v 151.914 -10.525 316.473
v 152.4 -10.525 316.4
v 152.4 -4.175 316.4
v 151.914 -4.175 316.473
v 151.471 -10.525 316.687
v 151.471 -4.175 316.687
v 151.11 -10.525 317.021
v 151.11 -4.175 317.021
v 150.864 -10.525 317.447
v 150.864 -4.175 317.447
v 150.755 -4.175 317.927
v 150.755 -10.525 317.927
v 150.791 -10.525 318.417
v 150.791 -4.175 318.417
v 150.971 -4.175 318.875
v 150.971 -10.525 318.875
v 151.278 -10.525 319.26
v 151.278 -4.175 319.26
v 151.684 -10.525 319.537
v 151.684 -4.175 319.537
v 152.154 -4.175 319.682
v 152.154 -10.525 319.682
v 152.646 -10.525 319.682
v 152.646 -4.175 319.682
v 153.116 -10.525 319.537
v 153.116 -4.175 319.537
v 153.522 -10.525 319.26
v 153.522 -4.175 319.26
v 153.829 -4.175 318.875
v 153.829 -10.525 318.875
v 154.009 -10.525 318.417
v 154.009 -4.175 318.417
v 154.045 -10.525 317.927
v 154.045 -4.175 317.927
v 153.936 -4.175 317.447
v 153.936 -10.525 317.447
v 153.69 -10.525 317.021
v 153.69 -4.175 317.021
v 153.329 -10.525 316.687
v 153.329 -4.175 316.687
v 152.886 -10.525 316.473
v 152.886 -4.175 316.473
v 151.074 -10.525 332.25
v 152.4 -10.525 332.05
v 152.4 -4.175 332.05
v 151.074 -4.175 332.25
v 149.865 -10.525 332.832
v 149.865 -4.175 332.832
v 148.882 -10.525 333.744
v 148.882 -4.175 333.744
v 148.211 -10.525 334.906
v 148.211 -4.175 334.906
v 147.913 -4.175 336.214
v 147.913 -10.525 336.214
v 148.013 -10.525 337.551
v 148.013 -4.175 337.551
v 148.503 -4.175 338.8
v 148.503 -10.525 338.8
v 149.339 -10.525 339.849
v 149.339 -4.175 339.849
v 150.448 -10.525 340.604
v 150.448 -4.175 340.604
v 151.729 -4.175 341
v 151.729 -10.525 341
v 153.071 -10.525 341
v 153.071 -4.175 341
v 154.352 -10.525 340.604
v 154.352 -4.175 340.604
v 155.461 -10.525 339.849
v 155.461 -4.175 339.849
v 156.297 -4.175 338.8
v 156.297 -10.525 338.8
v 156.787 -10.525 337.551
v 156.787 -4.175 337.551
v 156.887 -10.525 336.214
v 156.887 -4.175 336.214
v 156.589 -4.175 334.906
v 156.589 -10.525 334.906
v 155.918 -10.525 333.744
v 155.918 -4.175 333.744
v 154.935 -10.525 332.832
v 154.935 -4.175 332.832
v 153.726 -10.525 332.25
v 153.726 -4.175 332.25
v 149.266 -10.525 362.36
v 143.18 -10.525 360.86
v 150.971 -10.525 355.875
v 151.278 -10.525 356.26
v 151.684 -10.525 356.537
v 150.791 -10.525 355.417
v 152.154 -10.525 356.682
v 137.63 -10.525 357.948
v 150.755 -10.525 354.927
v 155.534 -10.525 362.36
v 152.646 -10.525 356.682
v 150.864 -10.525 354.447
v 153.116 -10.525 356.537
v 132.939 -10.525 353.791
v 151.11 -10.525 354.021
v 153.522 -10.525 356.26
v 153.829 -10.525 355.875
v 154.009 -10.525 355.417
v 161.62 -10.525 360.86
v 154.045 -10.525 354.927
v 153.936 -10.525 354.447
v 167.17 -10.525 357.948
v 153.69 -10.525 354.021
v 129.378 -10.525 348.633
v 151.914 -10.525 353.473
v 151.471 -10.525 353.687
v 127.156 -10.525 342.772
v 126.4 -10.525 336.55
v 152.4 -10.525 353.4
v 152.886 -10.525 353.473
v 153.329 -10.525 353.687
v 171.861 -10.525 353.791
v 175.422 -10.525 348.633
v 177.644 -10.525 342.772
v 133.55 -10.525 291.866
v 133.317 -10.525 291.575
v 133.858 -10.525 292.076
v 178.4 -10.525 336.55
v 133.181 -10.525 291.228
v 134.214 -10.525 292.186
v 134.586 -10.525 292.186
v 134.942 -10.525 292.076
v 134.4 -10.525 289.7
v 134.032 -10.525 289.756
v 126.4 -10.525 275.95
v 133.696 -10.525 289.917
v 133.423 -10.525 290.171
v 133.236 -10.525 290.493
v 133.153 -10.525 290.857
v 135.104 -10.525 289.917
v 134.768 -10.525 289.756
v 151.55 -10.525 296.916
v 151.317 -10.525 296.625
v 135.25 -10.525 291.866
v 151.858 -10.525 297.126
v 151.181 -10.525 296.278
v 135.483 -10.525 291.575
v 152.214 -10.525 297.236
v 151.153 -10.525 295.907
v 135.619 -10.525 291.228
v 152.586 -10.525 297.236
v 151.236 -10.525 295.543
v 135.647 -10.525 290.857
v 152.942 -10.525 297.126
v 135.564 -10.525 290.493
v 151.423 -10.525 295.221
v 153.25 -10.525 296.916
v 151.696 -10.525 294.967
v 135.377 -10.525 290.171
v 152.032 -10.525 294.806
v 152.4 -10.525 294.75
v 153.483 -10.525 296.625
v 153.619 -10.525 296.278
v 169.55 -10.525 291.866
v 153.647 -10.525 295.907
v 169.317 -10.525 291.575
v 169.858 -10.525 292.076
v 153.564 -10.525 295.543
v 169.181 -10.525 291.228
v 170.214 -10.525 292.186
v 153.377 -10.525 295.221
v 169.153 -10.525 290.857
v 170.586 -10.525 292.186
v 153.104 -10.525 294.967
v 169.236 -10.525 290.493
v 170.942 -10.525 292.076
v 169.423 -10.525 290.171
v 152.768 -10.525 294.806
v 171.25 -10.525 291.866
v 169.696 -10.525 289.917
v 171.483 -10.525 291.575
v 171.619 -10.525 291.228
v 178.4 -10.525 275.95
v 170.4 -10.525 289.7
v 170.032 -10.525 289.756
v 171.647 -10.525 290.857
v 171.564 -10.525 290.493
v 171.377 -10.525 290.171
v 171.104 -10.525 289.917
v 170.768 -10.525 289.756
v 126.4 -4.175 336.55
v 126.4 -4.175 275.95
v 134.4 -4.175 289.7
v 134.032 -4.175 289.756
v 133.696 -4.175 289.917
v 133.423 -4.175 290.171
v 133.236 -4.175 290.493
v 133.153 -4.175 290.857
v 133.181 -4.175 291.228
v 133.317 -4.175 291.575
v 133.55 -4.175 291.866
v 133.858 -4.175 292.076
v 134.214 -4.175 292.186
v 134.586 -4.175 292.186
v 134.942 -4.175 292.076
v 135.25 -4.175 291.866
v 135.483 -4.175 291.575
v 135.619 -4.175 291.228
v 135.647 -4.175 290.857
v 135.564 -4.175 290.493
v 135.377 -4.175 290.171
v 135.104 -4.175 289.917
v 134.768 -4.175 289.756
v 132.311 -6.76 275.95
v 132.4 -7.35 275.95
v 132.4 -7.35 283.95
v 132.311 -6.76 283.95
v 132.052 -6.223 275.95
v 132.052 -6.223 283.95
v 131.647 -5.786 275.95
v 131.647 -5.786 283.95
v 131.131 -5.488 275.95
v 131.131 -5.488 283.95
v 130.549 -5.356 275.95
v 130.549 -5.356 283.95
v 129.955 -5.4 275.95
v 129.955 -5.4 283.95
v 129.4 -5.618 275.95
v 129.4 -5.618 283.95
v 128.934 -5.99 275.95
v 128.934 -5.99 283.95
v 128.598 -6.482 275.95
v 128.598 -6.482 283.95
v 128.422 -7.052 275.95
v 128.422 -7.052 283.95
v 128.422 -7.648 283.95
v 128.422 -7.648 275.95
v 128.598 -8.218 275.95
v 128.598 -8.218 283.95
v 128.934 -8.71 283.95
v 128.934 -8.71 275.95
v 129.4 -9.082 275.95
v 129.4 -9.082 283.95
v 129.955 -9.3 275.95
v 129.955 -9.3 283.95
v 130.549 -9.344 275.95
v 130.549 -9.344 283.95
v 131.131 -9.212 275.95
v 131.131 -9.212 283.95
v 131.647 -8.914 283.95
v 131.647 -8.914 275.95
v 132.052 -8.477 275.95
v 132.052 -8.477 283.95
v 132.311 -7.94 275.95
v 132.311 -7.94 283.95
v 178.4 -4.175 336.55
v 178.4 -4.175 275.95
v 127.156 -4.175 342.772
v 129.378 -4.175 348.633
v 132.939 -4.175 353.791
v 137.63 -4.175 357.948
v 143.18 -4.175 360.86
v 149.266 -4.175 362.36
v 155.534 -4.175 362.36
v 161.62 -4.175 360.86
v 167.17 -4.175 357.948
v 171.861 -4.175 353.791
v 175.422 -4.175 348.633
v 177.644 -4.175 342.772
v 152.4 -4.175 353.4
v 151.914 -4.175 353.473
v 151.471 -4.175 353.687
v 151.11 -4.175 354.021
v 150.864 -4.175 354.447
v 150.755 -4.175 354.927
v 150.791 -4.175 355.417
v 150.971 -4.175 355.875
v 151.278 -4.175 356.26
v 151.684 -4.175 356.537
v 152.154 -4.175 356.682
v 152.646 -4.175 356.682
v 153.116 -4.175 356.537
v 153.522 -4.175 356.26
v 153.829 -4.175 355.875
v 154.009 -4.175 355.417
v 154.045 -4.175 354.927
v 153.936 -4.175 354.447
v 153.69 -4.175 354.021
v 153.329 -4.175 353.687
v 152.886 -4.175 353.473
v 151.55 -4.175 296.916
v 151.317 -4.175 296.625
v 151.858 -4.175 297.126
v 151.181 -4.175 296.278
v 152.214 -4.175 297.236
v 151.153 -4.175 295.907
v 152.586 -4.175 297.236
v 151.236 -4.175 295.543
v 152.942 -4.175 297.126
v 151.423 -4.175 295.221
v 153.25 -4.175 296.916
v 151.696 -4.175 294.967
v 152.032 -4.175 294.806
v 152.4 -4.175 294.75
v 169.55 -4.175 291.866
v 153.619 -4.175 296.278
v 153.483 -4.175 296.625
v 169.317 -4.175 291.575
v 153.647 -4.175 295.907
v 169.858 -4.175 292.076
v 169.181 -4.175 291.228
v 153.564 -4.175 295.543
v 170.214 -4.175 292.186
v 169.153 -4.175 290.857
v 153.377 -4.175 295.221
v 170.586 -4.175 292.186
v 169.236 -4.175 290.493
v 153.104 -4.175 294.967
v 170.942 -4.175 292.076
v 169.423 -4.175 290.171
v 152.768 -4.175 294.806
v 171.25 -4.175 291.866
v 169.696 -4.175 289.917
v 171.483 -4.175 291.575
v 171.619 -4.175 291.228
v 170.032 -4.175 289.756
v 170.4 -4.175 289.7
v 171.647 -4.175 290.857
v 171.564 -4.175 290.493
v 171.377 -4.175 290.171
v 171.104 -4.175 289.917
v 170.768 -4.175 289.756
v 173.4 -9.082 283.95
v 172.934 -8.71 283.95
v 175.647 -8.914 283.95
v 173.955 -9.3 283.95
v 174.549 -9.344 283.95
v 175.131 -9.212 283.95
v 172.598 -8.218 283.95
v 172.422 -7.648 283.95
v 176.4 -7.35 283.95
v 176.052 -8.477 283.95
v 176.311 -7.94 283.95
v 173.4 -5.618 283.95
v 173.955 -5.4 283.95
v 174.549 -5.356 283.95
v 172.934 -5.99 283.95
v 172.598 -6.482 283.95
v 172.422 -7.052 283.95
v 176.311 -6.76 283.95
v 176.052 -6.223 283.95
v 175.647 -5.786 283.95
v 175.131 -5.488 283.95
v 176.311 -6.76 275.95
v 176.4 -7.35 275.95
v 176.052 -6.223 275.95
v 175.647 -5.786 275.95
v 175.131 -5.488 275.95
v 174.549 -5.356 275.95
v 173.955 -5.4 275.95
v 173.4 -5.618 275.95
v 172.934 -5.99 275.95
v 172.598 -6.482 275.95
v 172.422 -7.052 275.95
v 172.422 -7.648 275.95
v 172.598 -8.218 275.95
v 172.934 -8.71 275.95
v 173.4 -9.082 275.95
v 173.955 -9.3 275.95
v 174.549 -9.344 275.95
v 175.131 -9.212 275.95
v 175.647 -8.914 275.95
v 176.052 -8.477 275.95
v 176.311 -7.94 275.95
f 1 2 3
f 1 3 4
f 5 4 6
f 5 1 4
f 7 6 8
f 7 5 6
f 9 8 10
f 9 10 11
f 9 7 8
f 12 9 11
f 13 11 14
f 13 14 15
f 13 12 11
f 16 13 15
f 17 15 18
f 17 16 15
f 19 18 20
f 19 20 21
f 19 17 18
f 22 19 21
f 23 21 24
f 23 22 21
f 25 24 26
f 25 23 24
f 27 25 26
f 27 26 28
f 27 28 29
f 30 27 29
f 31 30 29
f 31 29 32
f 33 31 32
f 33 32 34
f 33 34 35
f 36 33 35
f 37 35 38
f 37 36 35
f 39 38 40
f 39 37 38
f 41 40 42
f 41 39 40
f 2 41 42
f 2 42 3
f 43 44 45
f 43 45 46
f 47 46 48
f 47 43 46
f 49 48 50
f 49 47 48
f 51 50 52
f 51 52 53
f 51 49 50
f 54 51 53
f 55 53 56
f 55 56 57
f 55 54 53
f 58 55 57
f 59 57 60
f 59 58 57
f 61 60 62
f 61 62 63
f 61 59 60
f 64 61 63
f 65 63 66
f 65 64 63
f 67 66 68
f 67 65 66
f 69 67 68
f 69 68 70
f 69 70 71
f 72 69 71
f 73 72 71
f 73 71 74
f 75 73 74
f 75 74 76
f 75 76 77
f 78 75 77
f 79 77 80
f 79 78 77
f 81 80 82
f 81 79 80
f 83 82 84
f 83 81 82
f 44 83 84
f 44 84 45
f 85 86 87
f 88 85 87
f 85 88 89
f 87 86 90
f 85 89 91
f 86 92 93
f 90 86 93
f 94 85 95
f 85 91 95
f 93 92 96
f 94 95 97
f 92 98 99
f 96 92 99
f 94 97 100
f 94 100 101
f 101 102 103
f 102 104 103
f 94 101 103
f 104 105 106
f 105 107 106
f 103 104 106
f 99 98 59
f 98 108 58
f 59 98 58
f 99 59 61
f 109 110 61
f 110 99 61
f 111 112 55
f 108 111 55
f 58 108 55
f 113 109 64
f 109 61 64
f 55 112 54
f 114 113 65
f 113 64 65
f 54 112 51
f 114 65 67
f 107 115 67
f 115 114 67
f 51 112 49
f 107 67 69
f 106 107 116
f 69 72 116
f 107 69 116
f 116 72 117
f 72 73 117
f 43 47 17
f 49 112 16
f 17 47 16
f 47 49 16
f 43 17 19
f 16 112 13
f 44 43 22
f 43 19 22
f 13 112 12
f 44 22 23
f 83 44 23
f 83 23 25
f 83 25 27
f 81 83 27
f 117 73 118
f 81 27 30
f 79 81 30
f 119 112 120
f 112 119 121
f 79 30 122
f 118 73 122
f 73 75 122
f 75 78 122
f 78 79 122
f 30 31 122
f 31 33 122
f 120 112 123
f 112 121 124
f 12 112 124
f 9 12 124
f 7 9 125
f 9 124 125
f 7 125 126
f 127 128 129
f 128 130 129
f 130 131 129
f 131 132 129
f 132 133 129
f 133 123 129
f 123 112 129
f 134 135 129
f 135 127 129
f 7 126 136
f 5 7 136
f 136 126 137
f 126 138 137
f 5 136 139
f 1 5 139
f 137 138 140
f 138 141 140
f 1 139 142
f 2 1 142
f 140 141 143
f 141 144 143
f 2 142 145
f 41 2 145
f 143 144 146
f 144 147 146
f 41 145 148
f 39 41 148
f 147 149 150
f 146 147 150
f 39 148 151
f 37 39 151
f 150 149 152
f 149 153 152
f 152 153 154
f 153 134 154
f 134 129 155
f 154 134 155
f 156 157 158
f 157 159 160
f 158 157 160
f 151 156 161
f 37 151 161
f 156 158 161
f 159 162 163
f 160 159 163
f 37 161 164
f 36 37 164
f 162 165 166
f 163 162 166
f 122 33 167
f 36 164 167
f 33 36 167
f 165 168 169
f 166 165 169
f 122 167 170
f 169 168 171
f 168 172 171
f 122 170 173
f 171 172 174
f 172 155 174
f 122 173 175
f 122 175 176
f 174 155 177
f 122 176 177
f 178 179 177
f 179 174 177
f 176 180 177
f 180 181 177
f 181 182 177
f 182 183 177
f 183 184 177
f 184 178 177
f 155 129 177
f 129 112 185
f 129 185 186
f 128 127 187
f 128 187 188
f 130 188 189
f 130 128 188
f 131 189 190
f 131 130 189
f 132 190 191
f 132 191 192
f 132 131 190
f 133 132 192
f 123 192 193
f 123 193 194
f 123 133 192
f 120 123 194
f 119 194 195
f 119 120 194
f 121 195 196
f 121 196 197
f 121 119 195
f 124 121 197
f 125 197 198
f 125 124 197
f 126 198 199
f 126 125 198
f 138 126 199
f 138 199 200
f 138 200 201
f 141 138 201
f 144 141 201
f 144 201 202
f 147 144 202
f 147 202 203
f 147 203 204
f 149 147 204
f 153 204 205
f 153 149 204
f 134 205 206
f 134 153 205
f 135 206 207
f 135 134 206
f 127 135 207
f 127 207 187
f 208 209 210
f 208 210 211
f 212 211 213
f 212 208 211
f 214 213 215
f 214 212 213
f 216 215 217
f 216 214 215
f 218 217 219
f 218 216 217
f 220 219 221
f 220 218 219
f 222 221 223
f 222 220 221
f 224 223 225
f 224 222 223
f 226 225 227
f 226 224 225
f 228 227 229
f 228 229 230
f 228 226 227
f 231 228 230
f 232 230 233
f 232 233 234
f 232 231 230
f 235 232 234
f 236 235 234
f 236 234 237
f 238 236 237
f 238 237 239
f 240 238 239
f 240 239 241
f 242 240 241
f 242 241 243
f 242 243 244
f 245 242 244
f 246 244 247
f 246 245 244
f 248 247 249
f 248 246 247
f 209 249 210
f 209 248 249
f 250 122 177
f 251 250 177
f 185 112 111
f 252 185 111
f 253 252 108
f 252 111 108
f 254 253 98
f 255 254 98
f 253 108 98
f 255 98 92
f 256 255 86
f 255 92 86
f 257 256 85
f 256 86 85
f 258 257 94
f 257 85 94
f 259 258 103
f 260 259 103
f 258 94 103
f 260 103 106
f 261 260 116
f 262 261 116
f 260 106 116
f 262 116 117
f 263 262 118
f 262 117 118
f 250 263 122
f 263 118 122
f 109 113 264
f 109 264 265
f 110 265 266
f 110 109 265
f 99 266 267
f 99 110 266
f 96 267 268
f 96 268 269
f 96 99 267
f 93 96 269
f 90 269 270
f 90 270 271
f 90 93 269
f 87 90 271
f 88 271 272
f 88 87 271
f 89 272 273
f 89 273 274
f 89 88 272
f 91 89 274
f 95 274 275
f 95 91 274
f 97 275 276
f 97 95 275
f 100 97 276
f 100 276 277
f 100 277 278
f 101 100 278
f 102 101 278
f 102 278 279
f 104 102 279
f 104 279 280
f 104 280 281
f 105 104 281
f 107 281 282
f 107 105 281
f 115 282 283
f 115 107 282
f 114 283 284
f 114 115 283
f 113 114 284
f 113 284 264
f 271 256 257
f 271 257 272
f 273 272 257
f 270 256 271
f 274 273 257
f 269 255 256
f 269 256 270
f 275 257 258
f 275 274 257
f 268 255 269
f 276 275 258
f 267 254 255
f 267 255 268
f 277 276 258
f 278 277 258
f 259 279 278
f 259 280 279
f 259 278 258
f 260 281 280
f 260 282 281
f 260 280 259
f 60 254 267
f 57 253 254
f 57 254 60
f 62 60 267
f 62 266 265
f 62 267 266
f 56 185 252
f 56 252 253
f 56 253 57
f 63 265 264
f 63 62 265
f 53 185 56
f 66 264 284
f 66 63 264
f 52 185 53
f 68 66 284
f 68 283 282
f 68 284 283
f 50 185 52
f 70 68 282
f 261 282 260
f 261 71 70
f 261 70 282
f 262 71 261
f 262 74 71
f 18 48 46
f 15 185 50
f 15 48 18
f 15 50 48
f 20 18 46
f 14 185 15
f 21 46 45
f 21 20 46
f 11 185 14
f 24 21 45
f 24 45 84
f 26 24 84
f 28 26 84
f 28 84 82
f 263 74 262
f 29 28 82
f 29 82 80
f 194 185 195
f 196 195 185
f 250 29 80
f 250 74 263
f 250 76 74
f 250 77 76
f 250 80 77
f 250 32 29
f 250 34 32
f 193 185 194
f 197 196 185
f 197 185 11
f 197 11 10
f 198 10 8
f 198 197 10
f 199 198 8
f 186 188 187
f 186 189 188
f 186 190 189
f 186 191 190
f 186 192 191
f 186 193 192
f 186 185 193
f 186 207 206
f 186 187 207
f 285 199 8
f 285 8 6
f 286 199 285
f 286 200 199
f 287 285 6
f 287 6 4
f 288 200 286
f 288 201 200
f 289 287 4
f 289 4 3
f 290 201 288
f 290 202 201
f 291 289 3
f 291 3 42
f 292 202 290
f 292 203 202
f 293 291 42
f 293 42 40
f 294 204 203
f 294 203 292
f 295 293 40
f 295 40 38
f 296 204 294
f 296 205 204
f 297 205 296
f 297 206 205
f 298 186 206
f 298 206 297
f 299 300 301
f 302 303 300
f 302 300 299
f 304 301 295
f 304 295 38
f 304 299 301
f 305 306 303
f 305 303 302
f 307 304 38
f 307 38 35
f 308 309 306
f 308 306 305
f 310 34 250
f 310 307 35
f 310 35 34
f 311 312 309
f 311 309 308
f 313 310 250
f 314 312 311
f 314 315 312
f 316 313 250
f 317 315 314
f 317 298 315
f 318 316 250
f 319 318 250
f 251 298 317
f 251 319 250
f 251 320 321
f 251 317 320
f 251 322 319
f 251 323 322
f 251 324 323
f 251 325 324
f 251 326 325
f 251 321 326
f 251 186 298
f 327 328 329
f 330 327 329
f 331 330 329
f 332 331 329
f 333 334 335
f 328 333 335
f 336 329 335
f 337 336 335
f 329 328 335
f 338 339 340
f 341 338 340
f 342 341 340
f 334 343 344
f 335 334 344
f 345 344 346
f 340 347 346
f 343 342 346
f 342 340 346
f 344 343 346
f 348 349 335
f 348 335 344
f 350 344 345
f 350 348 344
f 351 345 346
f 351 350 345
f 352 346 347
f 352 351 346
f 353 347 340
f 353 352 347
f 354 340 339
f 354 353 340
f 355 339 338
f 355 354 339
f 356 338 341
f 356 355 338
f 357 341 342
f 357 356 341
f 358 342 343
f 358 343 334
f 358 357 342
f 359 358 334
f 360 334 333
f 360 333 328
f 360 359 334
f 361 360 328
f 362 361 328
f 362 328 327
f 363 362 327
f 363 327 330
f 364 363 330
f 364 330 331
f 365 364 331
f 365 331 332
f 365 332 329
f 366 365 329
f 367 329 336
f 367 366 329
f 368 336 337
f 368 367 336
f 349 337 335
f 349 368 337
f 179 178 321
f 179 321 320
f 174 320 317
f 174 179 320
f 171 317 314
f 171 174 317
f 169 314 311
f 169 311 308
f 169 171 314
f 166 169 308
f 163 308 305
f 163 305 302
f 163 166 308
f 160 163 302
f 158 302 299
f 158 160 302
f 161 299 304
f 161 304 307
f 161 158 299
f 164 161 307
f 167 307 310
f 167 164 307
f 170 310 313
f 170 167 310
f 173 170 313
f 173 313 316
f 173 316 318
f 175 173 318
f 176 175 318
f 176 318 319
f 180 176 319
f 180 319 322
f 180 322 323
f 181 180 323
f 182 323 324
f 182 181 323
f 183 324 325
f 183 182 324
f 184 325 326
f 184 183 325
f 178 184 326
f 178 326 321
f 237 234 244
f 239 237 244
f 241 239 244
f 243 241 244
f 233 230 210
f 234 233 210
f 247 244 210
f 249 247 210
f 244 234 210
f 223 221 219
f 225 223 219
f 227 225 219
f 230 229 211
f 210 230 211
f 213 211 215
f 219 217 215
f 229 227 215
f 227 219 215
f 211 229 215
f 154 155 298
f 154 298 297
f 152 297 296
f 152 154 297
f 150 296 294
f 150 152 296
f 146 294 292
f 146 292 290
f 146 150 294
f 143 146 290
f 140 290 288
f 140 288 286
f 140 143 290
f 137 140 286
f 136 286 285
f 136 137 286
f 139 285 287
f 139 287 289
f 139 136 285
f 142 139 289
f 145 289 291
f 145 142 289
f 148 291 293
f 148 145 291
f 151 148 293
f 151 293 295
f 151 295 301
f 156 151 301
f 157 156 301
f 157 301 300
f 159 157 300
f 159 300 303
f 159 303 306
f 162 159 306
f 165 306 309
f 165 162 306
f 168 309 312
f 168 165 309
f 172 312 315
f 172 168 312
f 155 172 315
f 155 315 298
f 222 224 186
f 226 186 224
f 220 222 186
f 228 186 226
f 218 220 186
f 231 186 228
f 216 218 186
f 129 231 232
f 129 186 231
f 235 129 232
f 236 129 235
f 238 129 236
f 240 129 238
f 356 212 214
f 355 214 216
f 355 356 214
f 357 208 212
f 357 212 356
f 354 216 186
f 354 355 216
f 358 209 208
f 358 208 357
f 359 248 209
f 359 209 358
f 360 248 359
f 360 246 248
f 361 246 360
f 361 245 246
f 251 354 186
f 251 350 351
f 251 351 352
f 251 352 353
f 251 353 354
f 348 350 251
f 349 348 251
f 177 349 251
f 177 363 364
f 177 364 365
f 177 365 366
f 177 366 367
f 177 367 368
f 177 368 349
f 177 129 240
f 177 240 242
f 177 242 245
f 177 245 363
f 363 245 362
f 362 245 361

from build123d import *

# Parameters (mm, degrees)
PARED_B_CHUMACERA_J5_START          = -10.525
CROQUIS1_W                          = 52
CROQUIS1_H                          = 60.6
PARED_B_CHUMACERA_J5_DEPTH          = 6.35
PARED_B_CHUMACERA_J5_REDONDEO_START = -10.525
CROQUIS2_R                          = 26
PARED_B_CHUMACERA_J5_REDONDEO_DEPTH = 6.35
PASO_PERNO_Y_ROSCA_M4_KFL08_START   = -10.525
CROQUIS3_R                          = 4.5
CROQUIS3_R_2                        = 1.65
PASO_PERNO_Y_ROSCA_M4_KFL08_DEPTH   = 6.35
ROSCA_M3_ESCUADRAS_START            = -10.525
CROQUIS4_R                          = 1.25
ROSCA_M3_ESCUADRAS_DEPTH            = 6.35
PASADORES_D4_START                  = 275.95
CROQUIS5_R                          = 2
PASADORES_D4_DEPTH                  = 8
ROSCA_M3_BASES_CINCHO_START         = -10.525
CROQUIS6_R                          = 1.25
ROSCA_M3_BASES_CINCHO_DEPTH         = 6.35


with BuildPart() as part:
    # Croquis1 → Pared_B_chumacera_J5 (new body)
    with BuildSketch(Plane(origin=(0, 0, 0), x_dir=(1, 0, 0), z_dir=(0, 1, 0)).offset(PARED_B_CHUMACERA_J5_START)):
        with Locations((152.4, -306.25)):
            Rectangle(CROQUIS1_W, CROQUIS1_H)
    extrude(amount=PARED_B_CHUMACERA_J5_DEPTH)

    # Croquis2 → Pared_B_chumacera_J5_redondeo (add)
    with BuildSketch(Plane(origin=(0, 0, 0), x_dir=(1, 0, 0), z_dir=(0, 1, 0)).offset(PARED_B_CHUMACERA_J5_REDONDEO_START)):
        with Locations((152.4, -336.55)):
            Circle(CROQUIS2_R)
    extrude(amount=PARED_B_CHUMACERA_J5_REDONDEO_DEPTH)

    # Croquis3 → Paso_perno_y_rosca_M4_KFL08 (cut)
    with BuildSketch(Plane(origin=(0, 0, 0), x_dir=(1, 0, 0), z_dir=(0, 1, 0)).offset(PASO_PERNO_Y_ROSCA_M4_KFL08_START)):
        with Locations(Location((152.4, -336.55, 0), (0, 0, 90))):
            Circle(CROQUIS3_R)
        with Locations(Location((152.4, -355.05, 0), (0, 0, 90))):
            Circle(CROQUIS3_R_2)
        with Locations(Location((152.4, -318.05, 0), (0, 0, 90))):
            Circle(CROQUIS3_R_2)
    extrude(amount=PASO_PERNO_Y_ROSCA_M4_KFL08_DEPTH, mode=Mode.SUBTRACT)

    # Croquis4 → Rosca_M3_escuadras (cut)
    with BuildSketch(Plane(origin=(0, 0, 0), x_dir=(1, 0, 0), z_dir=(0, 1, 0)).offset(ROSCA_M3_ESCUADRAS_START)):
        with Locations(Location((134.4, -290.95, 0), (0, 0, 90))):
            Circle(CROQUIS4_R)
        with Locations(Location((170.4, -290.95, 0), (0, 0, 90))):
            Circle(CROQUIS4_R)
    extrude(amount=ROSCA_M3_ESCUADRAS_DEPTH, mode=Mode.SUBTRACT)

    # Croquis5 → Pasadores_D4 (cut)
    with BuildSketch(Plane.XY.offset(PASADORES_D4_START)):
        with Locations((130.4, -7.35)):
            Circle(CROQUIS5_R)
        with Locations((174.4, -7.35)):
            Circle(CROQUIS5_R)
    extrude(amount=PASADORES_D4_DEPTH, mode=Mode.SUBTRACT)

    # Croquis6 → Rosca_M3_bases_cincho (cut)
    with BuildSketch(Plane(origin=(0, 0, 0), x_dir=(1, 0, 0), z_dir=(0, 1, 0)).offset(ROSCA_M3_BASES_CINCHO_START)):
        with Locations(Location((152.4, -296, 0), (0, 0, 90))):
            Circle(CROQUIS6_R)
    extrude(amount=ROSCA_M3_BASES_CINCHO_DEPTH, mode=Mode.SUBTRACT)


solid = part.part
